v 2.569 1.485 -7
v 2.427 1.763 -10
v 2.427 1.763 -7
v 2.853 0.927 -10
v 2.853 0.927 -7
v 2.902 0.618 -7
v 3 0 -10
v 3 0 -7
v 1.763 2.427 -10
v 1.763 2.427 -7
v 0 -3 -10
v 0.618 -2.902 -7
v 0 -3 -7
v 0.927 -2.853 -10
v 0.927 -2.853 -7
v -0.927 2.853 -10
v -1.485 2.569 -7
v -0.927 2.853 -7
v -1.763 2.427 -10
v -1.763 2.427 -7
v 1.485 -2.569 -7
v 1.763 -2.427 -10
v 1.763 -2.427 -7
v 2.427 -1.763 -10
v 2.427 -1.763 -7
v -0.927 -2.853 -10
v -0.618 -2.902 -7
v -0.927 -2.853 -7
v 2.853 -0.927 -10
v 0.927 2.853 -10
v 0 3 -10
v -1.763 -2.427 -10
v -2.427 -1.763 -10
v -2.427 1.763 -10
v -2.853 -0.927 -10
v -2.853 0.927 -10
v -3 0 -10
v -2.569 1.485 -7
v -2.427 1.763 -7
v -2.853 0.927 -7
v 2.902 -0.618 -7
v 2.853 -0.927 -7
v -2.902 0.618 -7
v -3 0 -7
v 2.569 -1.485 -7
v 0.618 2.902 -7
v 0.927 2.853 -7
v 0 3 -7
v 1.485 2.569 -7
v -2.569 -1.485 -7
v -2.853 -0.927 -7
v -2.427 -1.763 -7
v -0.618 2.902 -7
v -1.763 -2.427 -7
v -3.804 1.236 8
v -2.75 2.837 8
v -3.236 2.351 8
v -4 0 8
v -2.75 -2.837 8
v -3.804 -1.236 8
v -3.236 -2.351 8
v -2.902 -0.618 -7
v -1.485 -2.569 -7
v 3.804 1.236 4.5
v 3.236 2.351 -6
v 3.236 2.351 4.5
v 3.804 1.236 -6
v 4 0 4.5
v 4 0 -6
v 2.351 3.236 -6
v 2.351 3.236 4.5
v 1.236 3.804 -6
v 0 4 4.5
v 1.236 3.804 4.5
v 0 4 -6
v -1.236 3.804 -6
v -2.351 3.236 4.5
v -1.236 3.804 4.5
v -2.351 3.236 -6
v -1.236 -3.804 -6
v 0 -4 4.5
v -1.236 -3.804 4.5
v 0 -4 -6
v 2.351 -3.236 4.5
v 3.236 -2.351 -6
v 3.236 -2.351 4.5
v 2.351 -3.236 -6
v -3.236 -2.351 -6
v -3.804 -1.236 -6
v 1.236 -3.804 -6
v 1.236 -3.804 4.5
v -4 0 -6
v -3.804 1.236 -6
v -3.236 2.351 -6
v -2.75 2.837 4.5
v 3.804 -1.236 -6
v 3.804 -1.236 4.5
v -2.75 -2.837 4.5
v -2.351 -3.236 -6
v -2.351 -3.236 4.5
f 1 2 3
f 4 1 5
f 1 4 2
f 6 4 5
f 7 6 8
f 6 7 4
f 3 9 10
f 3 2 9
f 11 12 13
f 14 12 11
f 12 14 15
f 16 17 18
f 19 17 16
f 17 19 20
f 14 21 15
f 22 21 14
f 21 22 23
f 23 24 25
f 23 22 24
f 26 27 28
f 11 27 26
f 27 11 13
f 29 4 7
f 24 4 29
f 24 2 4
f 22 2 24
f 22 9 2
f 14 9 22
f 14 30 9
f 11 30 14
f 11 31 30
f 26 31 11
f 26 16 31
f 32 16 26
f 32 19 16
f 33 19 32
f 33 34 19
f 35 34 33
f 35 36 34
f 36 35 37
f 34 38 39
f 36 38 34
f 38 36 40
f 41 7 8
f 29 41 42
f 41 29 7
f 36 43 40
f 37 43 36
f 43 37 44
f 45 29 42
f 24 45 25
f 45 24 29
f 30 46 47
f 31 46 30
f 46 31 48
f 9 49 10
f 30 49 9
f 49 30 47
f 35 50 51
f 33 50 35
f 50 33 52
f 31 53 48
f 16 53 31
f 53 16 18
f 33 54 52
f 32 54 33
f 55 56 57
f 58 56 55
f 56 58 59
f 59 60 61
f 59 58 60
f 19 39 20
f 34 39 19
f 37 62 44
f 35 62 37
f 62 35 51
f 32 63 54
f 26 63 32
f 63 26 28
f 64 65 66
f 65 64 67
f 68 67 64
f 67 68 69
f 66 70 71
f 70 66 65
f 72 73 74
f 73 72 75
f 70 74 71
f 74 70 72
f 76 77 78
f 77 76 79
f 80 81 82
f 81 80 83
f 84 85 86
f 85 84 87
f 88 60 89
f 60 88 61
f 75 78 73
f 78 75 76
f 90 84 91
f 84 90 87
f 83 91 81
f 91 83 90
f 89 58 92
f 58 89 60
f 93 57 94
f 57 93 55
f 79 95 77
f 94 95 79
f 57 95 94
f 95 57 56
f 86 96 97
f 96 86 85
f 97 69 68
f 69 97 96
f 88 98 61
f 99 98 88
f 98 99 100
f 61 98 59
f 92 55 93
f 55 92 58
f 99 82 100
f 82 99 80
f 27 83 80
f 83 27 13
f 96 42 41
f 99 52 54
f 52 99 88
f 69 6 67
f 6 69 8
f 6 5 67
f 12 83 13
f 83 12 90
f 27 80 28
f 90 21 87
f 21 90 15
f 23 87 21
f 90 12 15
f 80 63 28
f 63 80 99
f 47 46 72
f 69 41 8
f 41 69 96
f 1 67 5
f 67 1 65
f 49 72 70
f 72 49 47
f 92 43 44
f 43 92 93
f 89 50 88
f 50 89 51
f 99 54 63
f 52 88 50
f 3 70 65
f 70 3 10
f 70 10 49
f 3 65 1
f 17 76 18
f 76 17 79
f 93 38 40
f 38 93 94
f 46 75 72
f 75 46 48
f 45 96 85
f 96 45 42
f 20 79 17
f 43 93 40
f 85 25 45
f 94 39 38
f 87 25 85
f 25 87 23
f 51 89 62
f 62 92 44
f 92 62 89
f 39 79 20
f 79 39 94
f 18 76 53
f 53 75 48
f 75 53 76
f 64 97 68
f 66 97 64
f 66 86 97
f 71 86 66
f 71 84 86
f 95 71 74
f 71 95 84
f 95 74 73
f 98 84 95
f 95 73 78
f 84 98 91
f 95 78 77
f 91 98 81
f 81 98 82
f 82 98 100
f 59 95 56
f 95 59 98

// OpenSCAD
// file: electronics.scad
/*
 * electronics.scad 
 *
 * (c) 2015 Prof Dr Andreas Mueller, Hochschule Rapperswil
 */
board_width = 27.94 + 0.1;
board_height = 40.64 + 0.1;
board_thickness = 2.0;

gap = 0.1;

width = 44;
height = 44;
r = 4;
bottom_height = 6;
top_height = 18;

button1_x = -board_width / 2 + 1.8;
button1_y = -9;

button2_x = -board_width / 2 + 1.8;
button2_y = +14;

led1_x = 25.5 - board_width/2;
led1_y = 18;
led2_x = led1_x;
led2_y = 1.5;

switchwidth = 3.5;
switchheight = 4.5;

button_gap = 0.2;

module bottom_part() {
	difference() {
		union() {
			cube([width - 2 * r, height, bottom_height], center = true);
			cube([width, height - 2 * r, bottom_height], center = true);
			translate([-width/2 + r, -height/2 + r, 0])
				cylinder(r = r, h = bottom_height, center = true, $fn = 30);
			translate([-width/2 + r, +height/2 - r, 0])
				cylinder(r = r, h = bottom_height, center = true, $fn = 30);
			translate([+width/2 - r, -height/2 + r, 0])
				cylinder(r = r, h = bottom_height, center = true, $fn = 30);
			translate([+width/2 - r, +height/2 - r, 0])
				cylinder(r = r, h = bottom_height, center = true, $fn = 30);
		}
		union() {
			translate([0, 0, bottom_height - board_thickness])
				cube([board_width + gap, board_height + gap, bottom_height], center = true);
			translate([0, 0, 1])
				cube([board_width - 2, board_height - 2, bottom_height], center = true);
			translate([-width/2 + r, -height/2 + r, 0])
				cylinder(r = 1.6, h = bottom_height + 11, center = true, $fn = 20);
			translate([-width/2 + r, +height/2 - r, 0])
				cylinder(r = 1.6, h = bottom_height + 1, center = true, $fn = 20);
			translate([+width/2 - r, -height/2 + r, 0])
				cylinder(r = 1.6, h = bottom_height + 1, center = true, $fn = 20);
			translate([+width/2 - r, +height/2 - r, 0])
				cylinder(r = 1.6, h = bottom_height + 1, center = true, $fn = 20);
			translate([button1_x, -button1_y, 1])
				cylinder(r = 4 + button_gap, h = bottom_height,  center = true, $fn = 30);
			translate([button2_x, -button2_y, 1])
				cylinder(r = 4 + button_gap, h = bottom_height,  center = true, $fn = 30);
		}
	}
	translate([width/2 - 1.5, -9, 15/2 + bottom_height/2 - 0.01])
		cube([3, 10.5, 15], center = true);
}

module	screwhole() {
		cylinder(r = 1.6, h = top_height + 1, center = true, $fn = 20);
		translate([0, 0, -(top_height + 0.01) / 2])
			cylinder(r1 = 3, r2 = 0, h = 3, $fn = 20);
}

module button_cutout() {
	cylinder(r = 3 + button_gap, h = top_height + 0.1, center = true, $fn = 20);
	translate([0, 0, 1])
		cylinder(r = 4 + button_gap, h = top_height, center = true, $fn = 20);
}

module top_part() {
	difference() {
		union() {
			cube([width - 2 * r, height, top_height], center = true);
			cube([width, height - 2 * r, top_height], center = true);
			translate([-width/2 + r, -height/2 + r, 0])
				cylinder(r = r, h = top_height, center = true, $fn = 20);
			translate([-width/2 + r, +height/2 - r, 0])
				cylinder(r = r, h = top_height, center = true, $fn = 20);
			translate([+width/2 - r, -height/2 + r, 0])
				cylinder(r = r, h = top_height, center = true, $fn = 20);
			translate([+width/2 - r, +height/2 - r, 0])
				cylinder(r = r, h = top_height, center = true, $fn = 20);
		}
		union() {
			difference() {
				union() {
					translate([0, 0, 1])
						cube([board_width, board_height - 2, top_height], center = true);
					translate([0, 0, 1])
						cube([board_width - 2, board_height, top_height], center = true);
				}
				translate([led1_x + 1, led1_y, -2])
					cube([6, 5, top_height], center = true);
				translate([led2_x + 1, led2_y, -2])
					cube([6, 4, top_height], center = true);
			}
			translate([-width/2 + r, -height/2 + r, 0])
				screwhole();
			translate([-width/2 + r, +height/2 - r, 0])
				screwhole();
			translate([+width/2 - r, -height/2 + r, 0])
				screwhole();
			translate([+width/2 - r, +height/2 - r, 0])
				screwhole();
			// opening for the power connector
			translate([width/2, -10, top_height/2 - 4.99])
				cube([20, 10, 10], center = true);
			// opening for 
			translate([width/2,  9, 1])
				cube([20, 11, top_height], center = true);
			// openings for buttons
			translate([button1_x, button1_y, 0])
				button_cutout();
			translate([button2_x, button2_y, 0])
				button_cutout();
			// holes for fibre optics
			translate([led1_x, led1_y, 0])
				cylinder(r = 0.9, h = top_height + 1, center = true, $fn = 10);
			translate([led2_x, led2_y, 0])
				cylinder(r = 0.9, h = top_height + 1, center = true, $fn = 10);
		}
	}
//	translate([button1_x, button1_y, 0]) button();
//	translate([button2_x, button2_y, 0]) button();
}

module button() {
	difference() {
		union() {
			translate([0, 0, -1])
				cylinder(r = 3, h = top_height, center = true, $fn = 20);
			translate([0, 0, 1])
				cylinder(r = 4, h = top_height - 4, center = true, $fn = 20);
			translate([0, 0, -(top_height - 4) / 2])
				cylinder(r1 = 2, r2 = 4, h = 2, center = true, $fn = 20);
		}
		translate([-switchwidth/2 + 4, 0, top_height - switchheight])
			cube([10, 10, top_height], center = true);
	}
}
// main file
/*
 * top.scad -- top part of the electornics housing
 *
 * (c) 2015 Prof Dr Andreas Mueller, Hochschule Rapperswil
 */

include <electronics.scad>

button();
